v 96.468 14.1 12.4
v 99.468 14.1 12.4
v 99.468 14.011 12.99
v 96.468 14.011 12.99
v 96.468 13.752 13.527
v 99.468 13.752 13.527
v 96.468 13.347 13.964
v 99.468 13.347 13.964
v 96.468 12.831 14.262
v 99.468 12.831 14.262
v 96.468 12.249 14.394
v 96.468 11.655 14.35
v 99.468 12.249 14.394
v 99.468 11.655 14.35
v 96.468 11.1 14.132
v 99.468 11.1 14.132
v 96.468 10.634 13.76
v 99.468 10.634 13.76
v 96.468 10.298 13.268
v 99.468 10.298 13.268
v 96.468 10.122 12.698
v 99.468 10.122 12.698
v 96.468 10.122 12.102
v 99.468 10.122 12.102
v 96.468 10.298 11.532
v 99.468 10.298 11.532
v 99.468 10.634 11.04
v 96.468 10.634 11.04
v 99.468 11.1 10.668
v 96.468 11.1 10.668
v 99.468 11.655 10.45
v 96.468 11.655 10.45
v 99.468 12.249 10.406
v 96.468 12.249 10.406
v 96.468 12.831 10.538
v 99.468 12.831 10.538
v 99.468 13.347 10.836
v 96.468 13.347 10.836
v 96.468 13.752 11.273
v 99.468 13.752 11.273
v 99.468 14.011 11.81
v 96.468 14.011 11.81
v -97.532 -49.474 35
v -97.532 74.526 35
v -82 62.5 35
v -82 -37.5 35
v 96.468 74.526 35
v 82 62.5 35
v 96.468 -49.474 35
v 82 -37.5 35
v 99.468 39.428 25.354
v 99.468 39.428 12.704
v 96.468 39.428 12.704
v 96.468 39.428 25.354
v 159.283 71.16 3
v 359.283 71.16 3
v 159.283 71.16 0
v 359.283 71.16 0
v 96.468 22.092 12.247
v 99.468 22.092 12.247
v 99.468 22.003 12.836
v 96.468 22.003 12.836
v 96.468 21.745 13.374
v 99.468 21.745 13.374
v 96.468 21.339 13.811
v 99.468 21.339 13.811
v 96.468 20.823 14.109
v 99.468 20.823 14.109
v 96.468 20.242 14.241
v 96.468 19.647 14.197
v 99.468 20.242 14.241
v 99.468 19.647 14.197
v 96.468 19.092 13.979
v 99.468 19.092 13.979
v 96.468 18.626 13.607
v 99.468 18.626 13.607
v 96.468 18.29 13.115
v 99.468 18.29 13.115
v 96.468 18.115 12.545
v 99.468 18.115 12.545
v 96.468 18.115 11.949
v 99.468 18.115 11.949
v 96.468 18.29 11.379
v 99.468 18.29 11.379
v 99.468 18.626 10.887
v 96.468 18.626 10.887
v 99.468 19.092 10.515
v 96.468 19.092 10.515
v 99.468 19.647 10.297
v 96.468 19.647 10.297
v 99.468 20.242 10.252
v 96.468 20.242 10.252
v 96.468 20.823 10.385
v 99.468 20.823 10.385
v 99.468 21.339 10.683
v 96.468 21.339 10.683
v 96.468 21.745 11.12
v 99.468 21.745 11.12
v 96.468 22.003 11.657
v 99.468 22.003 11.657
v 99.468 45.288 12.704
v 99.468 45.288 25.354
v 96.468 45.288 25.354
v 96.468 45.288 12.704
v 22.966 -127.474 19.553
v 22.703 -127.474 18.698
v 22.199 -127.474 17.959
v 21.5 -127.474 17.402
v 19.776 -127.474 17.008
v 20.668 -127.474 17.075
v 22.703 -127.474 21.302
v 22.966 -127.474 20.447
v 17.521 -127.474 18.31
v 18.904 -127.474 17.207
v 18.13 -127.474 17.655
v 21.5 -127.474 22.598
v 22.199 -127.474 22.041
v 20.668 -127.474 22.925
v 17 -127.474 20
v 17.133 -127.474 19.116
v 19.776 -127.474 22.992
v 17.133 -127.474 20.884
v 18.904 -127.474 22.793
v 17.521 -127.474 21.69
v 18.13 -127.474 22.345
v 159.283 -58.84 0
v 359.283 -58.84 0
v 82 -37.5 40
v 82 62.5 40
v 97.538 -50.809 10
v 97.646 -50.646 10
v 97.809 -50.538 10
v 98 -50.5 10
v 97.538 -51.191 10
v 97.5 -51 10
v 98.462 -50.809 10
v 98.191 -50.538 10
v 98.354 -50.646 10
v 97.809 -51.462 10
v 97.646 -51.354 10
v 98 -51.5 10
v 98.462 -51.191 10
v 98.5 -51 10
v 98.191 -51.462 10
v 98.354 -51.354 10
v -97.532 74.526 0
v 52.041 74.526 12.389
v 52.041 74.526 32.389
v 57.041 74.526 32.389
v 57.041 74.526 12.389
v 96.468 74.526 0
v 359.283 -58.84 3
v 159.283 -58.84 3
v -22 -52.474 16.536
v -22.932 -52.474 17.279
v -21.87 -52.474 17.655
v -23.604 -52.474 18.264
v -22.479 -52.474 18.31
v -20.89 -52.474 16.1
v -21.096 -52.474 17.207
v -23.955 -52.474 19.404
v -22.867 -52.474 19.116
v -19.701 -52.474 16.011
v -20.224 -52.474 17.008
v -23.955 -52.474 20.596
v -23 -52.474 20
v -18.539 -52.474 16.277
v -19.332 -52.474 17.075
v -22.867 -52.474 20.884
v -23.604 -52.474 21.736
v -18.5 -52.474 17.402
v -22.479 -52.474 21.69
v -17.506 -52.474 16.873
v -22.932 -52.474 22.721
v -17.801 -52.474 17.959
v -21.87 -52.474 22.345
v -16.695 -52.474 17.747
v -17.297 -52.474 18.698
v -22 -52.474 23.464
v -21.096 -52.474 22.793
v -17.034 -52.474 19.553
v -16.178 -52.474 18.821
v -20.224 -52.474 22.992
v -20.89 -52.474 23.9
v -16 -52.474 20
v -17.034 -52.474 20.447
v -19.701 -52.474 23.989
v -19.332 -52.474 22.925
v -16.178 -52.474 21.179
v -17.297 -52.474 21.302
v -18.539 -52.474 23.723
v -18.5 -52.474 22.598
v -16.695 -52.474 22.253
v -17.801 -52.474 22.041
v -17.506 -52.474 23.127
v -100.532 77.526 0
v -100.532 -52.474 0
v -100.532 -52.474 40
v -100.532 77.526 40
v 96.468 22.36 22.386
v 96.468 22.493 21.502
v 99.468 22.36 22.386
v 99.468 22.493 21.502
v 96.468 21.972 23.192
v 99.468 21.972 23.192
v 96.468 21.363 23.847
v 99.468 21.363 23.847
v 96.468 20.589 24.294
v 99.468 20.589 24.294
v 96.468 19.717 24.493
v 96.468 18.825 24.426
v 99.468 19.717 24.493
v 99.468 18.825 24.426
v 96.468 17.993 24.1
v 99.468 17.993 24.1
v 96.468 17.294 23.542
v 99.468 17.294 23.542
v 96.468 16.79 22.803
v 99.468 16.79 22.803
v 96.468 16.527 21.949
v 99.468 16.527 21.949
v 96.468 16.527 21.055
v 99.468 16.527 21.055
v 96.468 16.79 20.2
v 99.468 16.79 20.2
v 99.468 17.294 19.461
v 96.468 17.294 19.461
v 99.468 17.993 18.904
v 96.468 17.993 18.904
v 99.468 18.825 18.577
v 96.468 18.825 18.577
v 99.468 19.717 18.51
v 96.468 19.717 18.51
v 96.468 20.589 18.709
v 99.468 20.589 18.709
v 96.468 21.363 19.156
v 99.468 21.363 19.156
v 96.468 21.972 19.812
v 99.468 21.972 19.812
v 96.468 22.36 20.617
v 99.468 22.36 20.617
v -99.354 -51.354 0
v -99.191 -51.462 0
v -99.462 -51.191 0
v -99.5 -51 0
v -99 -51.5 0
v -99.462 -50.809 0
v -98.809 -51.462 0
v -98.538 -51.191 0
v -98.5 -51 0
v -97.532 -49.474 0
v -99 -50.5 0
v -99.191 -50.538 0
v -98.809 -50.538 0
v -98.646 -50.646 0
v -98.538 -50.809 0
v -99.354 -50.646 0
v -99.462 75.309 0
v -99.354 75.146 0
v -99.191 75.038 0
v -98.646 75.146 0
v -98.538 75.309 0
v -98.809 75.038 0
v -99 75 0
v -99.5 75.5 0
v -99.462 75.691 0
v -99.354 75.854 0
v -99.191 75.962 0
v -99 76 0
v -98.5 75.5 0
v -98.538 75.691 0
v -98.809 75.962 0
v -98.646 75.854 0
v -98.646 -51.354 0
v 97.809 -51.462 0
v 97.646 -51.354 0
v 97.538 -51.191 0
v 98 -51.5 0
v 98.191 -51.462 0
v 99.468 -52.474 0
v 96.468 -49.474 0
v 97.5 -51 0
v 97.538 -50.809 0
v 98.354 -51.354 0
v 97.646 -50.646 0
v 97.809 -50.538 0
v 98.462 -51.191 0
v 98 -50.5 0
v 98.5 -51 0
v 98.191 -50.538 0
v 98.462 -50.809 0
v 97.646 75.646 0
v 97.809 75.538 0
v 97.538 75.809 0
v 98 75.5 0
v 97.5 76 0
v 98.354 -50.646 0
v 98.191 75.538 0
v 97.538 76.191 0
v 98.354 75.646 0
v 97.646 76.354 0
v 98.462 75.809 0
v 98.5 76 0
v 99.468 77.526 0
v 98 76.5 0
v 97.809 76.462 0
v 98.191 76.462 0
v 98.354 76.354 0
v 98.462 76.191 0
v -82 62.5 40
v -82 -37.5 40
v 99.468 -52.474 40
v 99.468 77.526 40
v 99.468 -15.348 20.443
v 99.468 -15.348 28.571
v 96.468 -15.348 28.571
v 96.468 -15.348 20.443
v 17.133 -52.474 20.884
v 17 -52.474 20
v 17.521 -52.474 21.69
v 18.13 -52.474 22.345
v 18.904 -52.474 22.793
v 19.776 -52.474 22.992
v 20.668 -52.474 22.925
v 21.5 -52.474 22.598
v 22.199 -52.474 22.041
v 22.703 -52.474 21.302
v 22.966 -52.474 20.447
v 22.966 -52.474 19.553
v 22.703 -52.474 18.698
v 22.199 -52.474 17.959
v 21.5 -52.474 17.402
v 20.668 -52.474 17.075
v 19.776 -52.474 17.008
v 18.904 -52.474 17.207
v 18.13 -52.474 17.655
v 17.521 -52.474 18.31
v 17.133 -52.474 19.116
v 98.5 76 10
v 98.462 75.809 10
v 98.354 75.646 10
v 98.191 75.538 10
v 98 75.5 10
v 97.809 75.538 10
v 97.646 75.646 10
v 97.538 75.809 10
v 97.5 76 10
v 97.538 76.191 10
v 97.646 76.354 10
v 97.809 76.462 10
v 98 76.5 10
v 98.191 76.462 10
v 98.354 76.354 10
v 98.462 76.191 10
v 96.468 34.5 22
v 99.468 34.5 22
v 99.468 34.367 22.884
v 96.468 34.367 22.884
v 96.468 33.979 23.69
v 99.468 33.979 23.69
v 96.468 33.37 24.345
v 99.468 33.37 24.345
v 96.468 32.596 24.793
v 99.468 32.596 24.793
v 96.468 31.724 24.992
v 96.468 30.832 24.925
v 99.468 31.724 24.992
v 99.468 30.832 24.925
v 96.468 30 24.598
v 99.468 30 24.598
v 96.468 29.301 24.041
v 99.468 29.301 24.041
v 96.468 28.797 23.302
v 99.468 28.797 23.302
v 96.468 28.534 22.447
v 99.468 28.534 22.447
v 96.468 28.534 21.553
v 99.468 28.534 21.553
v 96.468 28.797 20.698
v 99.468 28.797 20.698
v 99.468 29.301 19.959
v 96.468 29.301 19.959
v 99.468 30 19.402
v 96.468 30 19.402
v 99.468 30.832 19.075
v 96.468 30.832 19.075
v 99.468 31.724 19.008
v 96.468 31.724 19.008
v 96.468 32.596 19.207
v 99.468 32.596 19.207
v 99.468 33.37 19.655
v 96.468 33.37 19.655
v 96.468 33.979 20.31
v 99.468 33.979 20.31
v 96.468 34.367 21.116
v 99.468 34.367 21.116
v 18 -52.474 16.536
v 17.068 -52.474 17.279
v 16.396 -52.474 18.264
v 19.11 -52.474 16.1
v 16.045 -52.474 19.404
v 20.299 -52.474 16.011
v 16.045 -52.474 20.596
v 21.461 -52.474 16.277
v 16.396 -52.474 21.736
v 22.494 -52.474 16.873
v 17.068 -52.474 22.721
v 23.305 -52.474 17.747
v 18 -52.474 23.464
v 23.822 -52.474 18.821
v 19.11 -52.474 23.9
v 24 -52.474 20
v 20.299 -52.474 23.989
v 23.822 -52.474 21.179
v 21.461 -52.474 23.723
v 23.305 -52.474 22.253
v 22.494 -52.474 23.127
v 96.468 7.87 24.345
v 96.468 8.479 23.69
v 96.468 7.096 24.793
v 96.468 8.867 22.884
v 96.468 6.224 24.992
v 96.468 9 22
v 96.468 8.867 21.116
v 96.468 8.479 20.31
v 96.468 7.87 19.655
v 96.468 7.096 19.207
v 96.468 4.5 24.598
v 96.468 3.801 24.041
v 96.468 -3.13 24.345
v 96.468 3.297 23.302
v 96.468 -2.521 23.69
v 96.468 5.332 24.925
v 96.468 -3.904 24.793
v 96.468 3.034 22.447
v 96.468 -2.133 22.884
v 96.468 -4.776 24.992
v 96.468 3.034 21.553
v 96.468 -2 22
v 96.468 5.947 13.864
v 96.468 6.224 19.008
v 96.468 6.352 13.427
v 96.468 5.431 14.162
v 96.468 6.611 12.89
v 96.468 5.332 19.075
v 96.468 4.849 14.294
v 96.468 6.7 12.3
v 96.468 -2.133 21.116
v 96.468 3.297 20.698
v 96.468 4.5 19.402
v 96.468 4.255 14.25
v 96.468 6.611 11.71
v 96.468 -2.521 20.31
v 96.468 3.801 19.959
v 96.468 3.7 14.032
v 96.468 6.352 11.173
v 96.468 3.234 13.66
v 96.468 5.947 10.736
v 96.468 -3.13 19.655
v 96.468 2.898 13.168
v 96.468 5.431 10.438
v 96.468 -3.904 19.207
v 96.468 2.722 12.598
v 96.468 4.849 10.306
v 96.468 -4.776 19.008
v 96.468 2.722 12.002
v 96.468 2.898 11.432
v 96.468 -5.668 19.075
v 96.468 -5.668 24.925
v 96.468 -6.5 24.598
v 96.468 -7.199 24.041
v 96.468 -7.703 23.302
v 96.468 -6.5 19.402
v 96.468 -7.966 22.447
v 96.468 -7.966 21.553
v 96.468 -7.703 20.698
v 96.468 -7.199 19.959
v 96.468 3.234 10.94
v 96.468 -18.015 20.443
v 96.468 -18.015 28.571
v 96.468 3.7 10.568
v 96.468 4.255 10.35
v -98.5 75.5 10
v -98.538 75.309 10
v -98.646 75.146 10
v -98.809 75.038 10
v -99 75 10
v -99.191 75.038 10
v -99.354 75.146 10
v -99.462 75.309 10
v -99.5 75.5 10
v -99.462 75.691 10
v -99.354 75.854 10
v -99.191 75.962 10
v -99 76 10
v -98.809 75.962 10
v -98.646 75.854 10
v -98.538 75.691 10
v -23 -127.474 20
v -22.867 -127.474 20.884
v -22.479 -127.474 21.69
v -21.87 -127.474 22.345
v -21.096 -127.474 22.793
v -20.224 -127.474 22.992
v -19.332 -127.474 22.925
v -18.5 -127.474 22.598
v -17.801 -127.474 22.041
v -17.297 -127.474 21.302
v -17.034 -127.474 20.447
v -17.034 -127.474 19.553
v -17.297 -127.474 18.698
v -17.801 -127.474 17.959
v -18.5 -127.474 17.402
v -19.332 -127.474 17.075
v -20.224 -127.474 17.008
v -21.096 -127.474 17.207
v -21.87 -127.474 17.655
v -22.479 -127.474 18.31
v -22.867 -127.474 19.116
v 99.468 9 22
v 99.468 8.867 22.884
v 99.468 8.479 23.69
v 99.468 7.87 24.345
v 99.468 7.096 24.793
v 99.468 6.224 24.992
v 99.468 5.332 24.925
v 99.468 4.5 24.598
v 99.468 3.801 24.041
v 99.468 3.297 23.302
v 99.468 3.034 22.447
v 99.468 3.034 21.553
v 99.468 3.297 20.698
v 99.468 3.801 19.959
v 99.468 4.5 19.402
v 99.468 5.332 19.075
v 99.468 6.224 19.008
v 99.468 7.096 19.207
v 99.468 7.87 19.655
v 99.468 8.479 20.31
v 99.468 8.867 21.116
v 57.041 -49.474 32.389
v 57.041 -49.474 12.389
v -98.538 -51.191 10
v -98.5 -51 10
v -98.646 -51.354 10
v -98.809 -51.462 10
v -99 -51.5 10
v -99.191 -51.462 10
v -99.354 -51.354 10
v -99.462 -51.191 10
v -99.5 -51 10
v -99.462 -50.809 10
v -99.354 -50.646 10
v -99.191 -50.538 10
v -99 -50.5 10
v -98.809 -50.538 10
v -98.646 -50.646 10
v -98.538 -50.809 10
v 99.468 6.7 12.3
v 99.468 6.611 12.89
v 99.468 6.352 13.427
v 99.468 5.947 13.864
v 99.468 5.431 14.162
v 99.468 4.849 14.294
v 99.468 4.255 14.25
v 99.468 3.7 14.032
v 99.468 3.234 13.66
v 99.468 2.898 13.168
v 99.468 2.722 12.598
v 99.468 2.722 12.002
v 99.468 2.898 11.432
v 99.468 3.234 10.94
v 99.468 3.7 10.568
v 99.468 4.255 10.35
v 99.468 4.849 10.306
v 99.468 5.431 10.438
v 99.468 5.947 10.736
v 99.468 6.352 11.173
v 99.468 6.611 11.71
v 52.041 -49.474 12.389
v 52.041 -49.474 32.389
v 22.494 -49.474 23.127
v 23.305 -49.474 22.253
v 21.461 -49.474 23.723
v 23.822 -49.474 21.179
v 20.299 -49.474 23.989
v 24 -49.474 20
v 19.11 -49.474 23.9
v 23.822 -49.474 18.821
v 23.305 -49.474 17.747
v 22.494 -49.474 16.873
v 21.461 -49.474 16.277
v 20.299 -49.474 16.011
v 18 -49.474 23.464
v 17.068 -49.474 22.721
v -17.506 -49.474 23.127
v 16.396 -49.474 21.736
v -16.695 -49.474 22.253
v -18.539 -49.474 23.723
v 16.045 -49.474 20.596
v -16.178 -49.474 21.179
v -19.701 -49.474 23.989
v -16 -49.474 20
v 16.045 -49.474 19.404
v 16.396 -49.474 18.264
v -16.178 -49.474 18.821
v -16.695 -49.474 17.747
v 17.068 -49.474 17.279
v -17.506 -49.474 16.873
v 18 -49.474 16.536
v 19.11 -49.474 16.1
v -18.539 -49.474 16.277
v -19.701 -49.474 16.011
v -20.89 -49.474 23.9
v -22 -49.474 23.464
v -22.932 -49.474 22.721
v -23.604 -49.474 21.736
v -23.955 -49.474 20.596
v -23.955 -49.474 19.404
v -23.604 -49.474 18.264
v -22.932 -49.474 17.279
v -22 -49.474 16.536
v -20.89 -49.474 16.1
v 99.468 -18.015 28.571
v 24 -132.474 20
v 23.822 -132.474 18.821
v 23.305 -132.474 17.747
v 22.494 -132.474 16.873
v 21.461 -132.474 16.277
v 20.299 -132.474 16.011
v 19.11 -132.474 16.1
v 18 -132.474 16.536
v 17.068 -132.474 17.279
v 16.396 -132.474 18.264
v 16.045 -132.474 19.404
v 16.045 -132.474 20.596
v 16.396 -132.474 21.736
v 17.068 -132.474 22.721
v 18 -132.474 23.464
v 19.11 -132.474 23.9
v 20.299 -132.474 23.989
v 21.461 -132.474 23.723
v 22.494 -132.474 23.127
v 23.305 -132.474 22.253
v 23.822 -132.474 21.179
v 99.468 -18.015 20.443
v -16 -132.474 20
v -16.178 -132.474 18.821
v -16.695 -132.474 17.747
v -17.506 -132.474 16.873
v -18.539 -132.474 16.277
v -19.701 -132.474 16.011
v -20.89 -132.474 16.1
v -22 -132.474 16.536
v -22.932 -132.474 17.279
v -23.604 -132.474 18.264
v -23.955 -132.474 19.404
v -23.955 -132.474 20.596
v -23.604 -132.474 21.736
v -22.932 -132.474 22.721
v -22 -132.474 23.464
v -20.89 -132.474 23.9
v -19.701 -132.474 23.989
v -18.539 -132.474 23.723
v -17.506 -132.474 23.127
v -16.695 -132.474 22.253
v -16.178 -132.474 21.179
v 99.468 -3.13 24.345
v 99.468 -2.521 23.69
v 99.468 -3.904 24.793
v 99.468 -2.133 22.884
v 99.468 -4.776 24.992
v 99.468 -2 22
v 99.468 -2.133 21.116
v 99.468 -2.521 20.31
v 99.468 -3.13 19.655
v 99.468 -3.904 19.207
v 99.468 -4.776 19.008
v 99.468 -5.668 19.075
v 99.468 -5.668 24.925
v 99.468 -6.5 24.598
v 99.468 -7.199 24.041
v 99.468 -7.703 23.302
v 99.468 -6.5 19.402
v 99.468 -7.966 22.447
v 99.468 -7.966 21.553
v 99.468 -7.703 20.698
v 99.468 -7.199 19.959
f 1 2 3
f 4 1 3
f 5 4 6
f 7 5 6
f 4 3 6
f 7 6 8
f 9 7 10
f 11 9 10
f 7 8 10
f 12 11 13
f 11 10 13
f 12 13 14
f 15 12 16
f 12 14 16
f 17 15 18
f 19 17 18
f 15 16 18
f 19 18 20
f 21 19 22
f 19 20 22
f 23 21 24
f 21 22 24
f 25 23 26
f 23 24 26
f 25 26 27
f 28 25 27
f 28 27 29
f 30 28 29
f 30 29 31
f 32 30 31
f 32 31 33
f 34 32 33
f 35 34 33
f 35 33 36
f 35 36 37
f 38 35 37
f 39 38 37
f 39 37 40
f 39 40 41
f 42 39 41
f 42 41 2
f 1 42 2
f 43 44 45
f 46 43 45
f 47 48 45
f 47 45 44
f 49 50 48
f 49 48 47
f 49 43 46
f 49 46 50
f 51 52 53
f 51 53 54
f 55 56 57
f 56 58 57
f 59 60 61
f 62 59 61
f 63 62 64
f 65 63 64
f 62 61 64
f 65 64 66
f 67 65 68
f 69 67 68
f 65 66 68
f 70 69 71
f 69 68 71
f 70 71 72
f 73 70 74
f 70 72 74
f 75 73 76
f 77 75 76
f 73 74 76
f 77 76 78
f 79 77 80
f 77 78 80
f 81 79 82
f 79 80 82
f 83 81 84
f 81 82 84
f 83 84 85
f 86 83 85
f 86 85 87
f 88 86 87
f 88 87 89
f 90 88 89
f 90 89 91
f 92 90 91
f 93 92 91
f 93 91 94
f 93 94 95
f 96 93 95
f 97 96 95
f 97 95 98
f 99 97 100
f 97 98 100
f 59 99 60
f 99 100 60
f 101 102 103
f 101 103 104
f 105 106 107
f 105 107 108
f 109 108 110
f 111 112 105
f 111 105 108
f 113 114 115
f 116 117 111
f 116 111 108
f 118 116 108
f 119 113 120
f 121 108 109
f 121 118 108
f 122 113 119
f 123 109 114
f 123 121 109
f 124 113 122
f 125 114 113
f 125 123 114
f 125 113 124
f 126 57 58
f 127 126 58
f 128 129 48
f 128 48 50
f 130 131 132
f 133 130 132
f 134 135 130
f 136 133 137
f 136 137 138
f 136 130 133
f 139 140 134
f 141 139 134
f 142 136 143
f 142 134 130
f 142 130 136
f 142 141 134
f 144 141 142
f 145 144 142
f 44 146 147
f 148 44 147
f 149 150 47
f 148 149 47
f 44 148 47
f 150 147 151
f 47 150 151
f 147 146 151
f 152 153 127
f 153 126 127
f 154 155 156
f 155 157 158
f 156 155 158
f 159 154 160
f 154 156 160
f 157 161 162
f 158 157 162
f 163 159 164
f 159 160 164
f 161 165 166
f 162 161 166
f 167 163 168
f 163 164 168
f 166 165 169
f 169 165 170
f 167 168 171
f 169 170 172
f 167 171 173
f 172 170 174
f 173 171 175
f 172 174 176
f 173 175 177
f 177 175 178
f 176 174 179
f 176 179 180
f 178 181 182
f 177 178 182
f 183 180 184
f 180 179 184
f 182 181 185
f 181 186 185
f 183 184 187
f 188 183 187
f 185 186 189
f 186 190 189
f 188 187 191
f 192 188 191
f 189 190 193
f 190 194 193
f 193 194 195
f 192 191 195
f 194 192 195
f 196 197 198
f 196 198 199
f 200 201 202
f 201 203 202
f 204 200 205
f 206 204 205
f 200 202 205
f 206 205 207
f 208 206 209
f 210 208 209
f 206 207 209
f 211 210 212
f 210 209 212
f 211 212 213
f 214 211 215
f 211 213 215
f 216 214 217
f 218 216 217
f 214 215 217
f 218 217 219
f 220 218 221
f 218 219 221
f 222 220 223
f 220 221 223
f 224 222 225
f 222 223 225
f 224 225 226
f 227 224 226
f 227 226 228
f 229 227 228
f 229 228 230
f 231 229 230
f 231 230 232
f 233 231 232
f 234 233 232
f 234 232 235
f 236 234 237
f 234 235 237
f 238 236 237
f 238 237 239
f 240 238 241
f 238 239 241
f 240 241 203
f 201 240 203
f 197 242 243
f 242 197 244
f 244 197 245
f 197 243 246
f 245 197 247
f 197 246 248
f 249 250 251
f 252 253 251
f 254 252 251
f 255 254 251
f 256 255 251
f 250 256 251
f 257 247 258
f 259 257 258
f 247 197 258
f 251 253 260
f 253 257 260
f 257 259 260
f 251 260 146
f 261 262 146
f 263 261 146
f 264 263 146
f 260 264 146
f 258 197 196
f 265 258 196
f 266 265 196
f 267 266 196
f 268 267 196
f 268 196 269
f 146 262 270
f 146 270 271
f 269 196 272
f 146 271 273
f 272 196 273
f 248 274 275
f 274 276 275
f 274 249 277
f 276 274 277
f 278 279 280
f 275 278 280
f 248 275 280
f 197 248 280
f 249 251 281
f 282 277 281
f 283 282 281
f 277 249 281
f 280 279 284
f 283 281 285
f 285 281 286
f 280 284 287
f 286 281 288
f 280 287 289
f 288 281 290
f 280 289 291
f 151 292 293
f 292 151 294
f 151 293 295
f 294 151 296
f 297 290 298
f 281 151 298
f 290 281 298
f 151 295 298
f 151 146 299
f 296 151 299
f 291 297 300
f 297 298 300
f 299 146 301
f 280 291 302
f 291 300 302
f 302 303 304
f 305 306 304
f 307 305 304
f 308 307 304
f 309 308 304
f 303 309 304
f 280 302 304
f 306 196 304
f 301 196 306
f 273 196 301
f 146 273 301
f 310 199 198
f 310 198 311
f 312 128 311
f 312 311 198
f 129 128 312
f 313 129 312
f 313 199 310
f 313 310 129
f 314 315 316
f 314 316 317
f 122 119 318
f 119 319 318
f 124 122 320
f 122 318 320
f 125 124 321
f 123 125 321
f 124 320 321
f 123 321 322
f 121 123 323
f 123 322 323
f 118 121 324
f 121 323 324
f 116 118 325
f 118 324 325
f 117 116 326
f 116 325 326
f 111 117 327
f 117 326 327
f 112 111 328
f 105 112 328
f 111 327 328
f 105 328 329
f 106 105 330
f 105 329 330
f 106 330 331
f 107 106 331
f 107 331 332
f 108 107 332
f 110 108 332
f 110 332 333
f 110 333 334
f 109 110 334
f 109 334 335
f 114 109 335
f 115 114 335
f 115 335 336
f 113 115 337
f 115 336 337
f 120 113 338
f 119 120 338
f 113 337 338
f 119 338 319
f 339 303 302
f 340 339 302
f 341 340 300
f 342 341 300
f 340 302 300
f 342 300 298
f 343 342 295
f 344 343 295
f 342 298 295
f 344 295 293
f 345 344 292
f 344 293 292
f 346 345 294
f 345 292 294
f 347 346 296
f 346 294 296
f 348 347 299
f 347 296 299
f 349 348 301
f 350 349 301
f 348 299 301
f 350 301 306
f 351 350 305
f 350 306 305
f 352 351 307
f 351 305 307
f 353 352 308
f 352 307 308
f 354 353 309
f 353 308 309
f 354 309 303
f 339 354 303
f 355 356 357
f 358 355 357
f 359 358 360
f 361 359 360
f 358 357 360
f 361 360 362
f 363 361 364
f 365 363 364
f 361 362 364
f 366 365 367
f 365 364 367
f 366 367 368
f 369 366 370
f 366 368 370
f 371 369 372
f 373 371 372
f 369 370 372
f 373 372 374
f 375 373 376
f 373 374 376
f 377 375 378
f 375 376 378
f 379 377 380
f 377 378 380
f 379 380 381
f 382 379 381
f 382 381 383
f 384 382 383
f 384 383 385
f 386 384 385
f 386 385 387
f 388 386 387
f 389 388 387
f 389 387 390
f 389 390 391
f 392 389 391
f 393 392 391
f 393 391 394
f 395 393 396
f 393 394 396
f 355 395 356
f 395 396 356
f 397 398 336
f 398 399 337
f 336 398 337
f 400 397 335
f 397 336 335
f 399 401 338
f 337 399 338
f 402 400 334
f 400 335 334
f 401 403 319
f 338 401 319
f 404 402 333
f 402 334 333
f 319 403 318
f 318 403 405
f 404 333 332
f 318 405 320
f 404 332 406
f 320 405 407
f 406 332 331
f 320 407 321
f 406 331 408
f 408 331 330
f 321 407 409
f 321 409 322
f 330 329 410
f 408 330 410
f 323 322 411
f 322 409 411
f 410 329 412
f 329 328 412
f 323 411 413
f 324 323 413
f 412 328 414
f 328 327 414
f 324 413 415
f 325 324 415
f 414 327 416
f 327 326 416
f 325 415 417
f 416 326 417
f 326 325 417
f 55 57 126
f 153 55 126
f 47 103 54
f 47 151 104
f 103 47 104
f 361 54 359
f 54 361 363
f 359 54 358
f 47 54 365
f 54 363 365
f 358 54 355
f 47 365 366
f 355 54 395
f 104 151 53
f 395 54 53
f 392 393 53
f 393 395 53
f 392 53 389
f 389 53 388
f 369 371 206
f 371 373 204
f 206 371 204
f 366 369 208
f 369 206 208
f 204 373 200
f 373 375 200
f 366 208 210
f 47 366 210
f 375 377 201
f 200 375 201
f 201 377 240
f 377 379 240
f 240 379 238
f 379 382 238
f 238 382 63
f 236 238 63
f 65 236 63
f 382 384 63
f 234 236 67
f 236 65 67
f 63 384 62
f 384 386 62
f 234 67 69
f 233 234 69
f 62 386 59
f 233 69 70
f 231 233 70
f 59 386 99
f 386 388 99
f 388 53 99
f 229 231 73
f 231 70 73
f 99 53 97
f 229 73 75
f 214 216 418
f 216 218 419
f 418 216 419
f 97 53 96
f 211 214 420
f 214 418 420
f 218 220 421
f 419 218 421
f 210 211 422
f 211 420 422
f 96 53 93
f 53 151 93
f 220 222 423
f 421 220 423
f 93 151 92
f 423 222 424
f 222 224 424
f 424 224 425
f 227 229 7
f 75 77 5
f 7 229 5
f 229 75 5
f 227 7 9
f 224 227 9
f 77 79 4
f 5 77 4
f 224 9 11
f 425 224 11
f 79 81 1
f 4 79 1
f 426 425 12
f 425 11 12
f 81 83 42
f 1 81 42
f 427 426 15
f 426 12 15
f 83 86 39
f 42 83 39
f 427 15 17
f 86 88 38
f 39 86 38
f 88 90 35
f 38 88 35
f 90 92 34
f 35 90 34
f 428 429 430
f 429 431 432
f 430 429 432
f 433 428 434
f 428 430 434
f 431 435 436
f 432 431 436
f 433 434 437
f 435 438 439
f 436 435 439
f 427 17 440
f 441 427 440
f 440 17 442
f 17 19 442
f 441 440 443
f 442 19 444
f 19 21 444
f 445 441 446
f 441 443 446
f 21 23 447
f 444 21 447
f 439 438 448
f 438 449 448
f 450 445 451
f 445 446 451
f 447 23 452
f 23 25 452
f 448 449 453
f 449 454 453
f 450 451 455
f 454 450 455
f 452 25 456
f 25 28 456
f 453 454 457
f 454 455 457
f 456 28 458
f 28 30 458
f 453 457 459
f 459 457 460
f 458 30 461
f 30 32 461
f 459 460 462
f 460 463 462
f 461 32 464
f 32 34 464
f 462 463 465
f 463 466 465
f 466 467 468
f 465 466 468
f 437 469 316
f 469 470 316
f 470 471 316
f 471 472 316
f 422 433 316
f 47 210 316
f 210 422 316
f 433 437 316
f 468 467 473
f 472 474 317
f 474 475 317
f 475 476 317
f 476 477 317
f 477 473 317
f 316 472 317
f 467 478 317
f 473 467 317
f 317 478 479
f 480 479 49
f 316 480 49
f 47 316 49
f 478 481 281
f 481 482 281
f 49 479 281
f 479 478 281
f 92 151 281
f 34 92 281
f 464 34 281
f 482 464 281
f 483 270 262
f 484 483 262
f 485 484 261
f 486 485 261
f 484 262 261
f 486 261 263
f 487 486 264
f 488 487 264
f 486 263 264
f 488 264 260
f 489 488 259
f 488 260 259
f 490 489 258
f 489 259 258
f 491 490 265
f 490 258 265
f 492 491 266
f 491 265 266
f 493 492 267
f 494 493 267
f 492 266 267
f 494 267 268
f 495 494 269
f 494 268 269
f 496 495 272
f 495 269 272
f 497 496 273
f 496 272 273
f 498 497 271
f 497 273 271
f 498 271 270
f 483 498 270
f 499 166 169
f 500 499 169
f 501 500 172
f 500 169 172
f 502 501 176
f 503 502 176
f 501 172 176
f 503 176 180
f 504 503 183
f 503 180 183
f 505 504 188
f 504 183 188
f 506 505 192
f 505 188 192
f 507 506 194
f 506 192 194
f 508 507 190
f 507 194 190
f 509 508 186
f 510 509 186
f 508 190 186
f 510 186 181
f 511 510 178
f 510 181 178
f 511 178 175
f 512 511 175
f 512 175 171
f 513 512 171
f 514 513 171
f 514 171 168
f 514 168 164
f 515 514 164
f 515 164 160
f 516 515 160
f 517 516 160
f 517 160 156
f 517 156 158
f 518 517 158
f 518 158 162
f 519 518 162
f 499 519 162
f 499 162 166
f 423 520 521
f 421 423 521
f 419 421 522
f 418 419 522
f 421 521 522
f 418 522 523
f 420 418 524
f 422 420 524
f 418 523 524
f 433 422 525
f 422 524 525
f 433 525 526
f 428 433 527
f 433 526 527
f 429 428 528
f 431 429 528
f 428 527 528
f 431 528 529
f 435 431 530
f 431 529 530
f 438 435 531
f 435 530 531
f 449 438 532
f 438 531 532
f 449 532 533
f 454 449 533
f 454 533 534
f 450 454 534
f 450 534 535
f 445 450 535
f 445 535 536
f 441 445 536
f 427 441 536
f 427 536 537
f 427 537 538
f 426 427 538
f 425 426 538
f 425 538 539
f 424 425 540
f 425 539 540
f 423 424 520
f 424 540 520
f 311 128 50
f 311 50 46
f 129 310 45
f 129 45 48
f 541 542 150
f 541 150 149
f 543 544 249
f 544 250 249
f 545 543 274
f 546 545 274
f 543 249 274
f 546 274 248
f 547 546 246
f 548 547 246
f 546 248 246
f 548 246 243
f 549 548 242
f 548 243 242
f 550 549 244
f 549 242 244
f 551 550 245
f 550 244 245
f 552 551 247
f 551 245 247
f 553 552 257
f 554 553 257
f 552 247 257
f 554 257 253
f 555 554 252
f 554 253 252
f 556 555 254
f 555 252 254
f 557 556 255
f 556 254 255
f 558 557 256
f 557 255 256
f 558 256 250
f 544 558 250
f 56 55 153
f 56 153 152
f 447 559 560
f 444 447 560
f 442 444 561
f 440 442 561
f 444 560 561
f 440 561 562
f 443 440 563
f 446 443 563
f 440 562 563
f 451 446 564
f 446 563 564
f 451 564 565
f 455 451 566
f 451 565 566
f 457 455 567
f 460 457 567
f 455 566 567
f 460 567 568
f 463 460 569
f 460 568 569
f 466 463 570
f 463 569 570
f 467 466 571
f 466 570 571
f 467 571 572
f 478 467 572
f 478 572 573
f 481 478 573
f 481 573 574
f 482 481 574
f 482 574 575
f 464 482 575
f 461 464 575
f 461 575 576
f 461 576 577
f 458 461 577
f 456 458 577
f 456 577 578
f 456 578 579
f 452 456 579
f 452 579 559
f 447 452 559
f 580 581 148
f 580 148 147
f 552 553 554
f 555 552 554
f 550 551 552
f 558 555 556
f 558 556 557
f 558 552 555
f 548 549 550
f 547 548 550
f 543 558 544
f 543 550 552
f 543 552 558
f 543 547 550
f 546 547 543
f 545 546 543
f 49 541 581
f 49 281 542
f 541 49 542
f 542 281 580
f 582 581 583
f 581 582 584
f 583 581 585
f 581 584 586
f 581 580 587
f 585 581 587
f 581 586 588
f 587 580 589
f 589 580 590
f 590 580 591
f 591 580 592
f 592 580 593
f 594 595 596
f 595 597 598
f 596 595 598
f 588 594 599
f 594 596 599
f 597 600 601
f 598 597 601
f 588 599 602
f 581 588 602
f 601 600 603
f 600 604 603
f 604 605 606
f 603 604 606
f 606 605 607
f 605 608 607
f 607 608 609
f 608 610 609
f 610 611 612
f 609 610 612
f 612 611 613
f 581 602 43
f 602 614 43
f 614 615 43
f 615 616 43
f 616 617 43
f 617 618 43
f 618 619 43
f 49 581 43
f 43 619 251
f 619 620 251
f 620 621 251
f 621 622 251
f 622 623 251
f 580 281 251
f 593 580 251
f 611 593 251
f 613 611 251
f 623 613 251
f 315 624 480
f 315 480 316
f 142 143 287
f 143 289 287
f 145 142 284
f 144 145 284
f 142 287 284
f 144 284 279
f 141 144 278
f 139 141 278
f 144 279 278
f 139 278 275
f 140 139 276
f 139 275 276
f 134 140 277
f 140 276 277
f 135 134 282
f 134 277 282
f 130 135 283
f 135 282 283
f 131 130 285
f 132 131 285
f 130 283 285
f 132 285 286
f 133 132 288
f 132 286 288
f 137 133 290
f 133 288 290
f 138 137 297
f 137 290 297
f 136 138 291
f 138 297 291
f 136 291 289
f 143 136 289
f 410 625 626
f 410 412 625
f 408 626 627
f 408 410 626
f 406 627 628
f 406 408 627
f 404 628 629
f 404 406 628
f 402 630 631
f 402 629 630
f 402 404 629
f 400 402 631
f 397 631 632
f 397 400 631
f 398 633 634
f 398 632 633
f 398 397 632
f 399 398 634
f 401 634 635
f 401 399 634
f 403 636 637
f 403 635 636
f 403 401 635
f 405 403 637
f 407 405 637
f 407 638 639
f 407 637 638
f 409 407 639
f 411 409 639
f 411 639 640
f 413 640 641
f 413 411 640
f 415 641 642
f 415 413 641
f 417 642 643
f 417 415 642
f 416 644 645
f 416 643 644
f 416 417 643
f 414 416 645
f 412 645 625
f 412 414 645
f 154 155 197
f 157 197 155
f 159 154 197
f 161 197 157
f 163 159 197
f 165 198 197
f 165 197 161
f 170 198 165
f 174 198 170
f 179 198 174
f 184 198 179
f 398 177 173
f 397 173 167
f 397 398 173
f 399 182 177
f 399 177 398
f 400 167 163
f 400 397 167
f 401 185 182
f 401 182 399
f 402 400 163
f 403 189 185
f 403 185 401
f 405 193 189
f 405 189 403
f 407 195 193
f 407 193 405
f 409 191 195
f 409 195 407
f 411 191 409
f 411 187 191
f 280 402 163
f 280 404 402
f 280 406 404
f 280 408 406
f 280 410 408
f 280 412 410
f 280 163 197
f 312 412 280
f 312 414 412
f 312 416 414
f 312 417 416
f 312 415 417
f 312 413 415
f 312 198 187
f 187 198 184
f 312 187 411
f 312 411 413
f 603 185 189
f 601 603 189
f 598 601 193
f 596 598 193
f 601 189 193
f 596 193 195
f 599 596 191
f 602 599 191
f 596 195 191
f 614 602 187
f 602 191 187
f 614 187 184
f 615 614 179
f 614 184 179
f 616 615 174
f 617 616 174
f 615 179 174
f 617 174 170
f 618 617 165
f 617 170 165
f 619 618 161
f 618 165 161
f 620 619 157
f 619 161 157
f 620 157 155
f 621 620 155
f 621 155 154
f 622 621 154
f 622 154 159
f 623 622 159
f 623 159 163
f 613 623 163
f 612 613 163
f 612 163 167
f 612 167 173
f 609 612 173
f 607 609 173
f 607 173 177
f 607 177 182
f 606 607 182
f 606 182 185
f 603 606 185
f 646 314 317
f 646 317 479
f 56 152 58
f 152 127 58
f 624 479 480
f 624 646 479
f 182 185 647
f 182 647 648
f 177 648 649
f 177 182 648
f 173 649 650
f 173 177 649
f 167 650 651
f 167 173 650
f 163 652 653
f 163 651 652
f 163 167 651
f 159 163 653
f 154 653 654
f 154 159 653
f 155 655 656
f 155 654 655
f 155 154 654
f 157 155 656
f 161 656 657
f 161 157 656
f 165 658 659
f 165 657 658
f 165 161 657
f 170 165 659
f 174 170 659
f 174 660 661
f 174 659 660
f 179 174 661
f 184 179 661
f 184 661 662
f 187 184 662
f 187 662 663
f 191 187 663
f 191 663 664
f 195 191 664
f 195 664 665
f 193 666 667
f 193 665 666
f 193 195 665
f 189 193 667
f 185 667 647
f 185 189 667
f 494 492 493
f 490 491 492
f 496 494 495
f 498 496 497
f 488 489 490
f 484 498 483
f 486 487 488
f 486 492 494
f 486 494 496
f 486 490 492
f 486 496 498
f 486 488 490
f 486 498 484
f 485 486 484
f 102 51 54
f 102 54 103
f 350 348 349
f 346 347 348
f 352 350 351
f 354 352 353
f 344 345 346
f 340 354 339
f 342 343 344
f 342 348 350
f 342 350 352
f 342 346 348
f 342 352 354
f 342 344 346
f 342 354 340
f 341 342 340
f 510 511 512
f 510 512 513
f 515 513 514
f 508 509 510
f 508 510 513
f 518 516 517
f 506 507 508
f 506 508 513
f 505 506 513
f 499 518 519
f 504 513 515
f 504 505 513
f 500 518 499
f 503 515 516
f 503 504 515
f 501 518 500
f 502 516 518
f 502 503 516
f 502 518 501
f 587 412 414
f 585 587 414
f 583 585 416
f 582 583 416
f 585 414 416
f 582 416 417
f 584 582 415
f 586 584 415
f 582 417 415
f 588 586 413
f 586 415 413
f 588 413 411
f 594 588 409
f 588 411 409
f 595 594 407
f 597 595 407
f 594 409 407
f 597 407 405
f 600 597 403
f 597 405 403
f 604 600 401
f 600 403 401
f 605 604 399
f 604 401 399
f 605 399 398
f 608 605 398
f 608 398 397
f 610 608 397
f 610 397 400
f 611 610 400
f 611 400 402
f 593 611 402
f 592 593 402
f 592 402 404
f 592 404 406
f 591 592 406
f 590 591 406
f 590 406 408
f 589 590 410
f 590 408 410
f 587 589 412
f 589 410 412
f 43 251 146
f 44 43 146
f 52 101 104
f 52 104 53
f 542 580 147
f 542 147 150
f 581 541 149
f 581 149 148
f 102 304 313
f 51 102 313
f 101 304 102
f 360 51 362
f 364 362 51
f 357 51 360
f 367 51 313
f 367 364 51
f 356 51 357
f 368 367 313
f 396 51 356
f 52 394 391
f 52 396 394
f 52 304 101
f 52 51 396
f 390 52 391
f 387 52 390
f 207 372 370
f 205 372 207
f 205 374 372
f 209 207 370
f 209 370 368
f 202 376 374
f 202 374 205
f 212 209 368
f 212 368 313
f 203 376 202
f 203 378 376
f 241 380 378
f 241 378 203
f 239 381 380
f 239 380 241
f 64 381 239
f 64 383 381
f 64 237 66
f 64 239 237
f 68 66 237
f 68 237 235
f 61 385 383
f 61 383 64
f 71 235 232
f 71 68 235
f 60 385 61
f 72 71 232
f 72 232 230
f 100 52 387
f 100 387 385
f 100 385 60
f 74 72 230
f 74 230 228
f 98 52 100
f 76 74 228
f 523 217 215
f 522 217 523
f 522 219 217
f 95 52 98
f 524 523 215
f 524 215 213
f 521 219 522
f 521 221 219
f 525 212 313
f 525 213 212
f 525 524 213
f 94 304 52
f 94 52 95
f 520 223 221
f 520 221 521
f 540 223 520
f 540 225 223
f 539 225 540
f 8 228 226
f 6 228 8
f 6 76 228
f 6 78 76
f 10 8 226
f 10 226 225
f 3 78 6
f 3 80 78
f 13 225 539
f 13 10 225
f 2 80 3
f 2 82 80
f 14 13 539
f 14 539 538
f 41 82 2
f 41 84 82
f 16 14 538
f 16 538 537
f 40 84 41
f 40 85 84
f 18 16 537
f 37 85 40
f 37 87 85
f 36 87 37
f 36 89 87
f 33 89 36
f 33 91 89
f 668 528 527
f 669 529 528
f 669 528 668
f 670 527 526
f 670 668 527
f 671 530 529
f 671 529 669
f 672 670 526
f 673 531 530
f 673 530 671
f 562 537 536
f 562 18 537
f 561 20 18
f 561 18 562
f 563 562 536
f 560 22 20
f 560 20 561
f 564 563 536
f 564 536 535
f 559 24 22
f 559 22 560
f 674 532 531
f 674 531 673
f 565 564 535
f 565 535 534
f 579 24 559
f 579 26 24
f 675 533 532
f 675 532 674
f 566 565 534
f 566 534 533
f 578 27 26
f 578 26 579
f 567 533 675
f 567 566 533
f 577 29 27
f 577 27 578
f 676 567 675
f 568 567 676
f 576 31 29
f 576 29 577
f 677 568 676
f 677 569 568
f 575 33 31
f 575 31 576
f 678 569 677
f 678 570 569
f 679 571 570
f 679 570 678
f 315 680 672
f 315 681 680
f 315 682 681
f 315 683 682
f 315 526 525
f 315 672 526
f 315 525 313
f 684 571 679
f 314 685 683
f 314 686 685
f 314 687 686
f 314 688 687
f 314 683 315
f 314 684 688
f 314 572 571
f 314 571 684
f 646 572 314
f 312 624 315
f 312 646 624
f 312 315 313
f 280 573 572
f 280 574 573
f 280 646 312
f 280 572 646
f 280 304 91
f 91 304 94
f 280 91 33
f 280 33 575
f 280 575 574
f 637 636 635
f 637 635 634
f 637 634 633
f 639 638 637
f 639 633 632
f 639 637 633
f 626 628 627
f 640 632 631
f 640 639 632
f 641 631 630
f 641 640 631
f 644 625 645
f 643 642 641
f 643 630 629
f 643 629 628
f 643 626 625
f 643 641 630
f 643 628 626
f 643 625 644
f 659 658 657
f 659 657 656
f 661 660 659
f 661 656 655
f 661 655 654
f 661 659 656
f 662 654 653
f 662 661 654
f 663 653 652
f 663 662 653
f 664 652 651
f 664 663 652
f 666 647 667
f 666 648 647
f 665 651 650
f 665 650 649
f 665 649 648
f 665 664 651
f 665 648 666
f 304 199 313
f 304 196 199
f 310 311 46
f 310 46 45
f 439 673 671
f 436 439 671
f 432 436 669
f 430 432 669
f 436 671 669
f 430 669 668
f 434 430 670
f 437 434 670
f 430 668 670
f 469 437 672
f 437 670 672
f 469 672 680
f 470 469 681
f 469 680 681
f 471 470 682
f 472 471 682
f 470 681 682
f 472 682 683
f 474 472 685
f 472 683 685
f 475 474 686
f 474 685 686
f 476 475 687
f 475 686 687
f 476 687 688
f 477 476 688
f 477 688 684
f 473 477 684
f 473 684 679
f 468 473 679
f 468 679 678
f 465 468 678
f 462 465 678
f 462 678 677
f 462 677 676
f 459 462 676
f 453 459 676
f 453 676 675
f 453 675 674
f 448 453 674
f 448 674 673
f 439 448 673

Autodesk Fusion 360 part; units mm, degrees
sketch "Sketch1" plane through (0, 0, 0) normal (0, 0, 1) x (1, 0, 0)
  line L0 (99.4684, -52.4738) -> (-100.5316, -52.4738)
  line L1 (-100.5316, -52.4738) -> (-100.5316, 77.5262)
  line L2 (-100.5316, 77.5262) -> (99.4684, 77.5262)
  line L3 (99.4684, 77.5262) -> (99.4684, -52.4738)
  dimension "d1" = 200
  dimension "d2" = 130
extrude "Extrude1" add sketch "Sketch1" along normal blind 40 makes body 1
sketch "Sketch2" plane through (0, 0, 40) normal (0, 0, 1) x (-1, 0, 0)
  line L0 (-99.4684, -77.5262) -> (100.5316, -77.5262)
  line L1 (100.5316, -77.5262) -> (100.5316, 52.4738)
  line L2 (100.5316, 52.4738) -> (-99.4684, 52.4738)
  line L3 (-99.4684, 52.4738) -> (-99.4684, -77.5262)
  line L4 (82, -62.5) -> (-82, -62.5)
  line L5 (-82, -62.5) -> (-82, 37.5)
  line L6 (-82, 37.5) -> (82, 37.5)
  line L7 (82, 37.5) -> (82, -62.5)
  line L8 (82, -62.5) -> (-82, 37.5) construction
  line L9 (-82, -62.5) -> (82, 37.5) construction
  point P0 (0, -12.5)
  dimension "d5" = 164
  dimension "d6" = 100
extrude "Extrude2" cut sketch "Sketch2" along normal blind 0 and the other way blind 5 contours L4 L5 L6 L7 bodies 1
sketch "Sketch3" plane through (0, 0, 0) normal (0, 0, -1) x (1, 0, 0)
  line L0 (-100.5316, -77.5262) -> (99.4684, -77.5262)
  line L1 (99.4684, -77.5262) -> (99.4684, 52.4738)
  line L2 (99.4684, 52.4738) -> (-100.5316, 52.4738)
  line L3 (-100.5316, 52.4738) -> (-100.5316, -77.5262)
sketch "Sketch4" plane through (0, 0, 0) normal (0, 0, -1) x (1, 0, 0)
  line L0 (96.4684, 49.4738) -> (-97.5316, 49.4738)
  line L1 (-97.5316, 49.4738) -> (-97.5316, -74.5262)
  line L2 (-97.5316, -74.5262) -> (96.4684, -74.5262)
  line L3 (96.4684, -74.5262) -> (96.4684, 49.4738)
  line L4 (96.4684, 49.4738) -> (-97.5316, -74.5262) construction
  line L5 (-97.5316, 49.4738) -> (96.4684, -74.5262) construction
  line L6 (99.4684, 52.4738) -> (-100.5316, 52.4738)
  line L7 (-100.5316, 52.4738) -> (-100.5316, -77.5262)
  point P0 (-0.5316, -12.5262)
  dimension "d11" = 194
  dimension "d12" = 124
  dimension "d13" = 3
  dimension "d14" = 3
extrude "Extrude3" cut sketch "Sketch4" along normal blind 0 and the other way blind 35 bodies 1
sketch "Sketch5" plane through (99.4684, 0, 0) normal (1, 0, 0) x (0, 1, 0)
  line L0 (-52.4738, 0) -> (77.5262, 0)
  line L1 (77.5262, 0) -> (77.5262, 40)
  line L2 (77.5262, 40) -> (-52.4738, 40)
  line L3 (-52.4738, 40) -> (-52.4738, 0)
sketch "Sketch6" plane through (99.4684, 0, 0) normal (1, 0, 0) x (0, 1, 0)
  circle A0 centre (-5, 22) radius 3
  circle A1 centre (6, 22) radius 3
  circle A2 centre (19.493, 21.5017) radius 3
  circle A3 centre (31.5, 22) radius 3
  circle A4 centre (4.7, 12.3) radius 2
  circle A5 centre (12.1, 12.4) radius 2
  circle A6 centre (20.0923, 12.2469) radius 2
  line L0 (-18.0153, 28.5707) -> (-15.3483, 28.5707)
  line L1 (-15.3483, 28.5707) -> (-15.3483, 20.4427)
  line L2 (-15.3483, 20.4427) -> (-18.0153, 20.4427)
  line L3 (-18.0153, 20.4427) -> (-18.0153, 28.5707)
  line L4 (39.4285, 24.5918) -> (39.4285, 25.3538)
  line L5 (39.4285, 25.3538) -> (45.2885, 25.3538)
  line L6 (45.2885, 25.3538) -> (45.2885, 12.7038)
  line L7 (45.2885, 12.7038) -> (39.4285, 12.7038)
  line L8 (39.4285, 12.7038) -> (39.4285, 25.3538)
  dimension "d19" = 6
  dimension "d21" = 6
  dimension "d23" = 6
  dimension "d25" = 6
  dimension "d29" = 4
  dimension "d31" = 4
  dimension "d33" = 4
  dimension "d35" = 2.667
  dimension "d36" = 8.128
  dimension "d39" = 0.762
  dimension "d40" = 5.86
  dimension "d41" = 12.65
extrude "Extrude4" cut sketch "Sketch6" against normal blind 3 bodies 1
sketch "Sketch7" plane through (0, 0, 0) normal (0, 1, 0) x (1, 0, 0)
sketch "Sketch8" plane through (0, -52.4738, 0) normal (0, -1, 0) x (1, 0, 0)
  line L0 (-100.5316, 0) -> (99.4684, 0)
  line L1 (99.4684, 0) -> (99.4684, 40)
  line L2 (99.4684, 40) -> (-100.5316, 40)
  line L3 (-100.5316, 40) -> (-100.5316, 0)
  circle A0 centre (-20, 20) radius 4
  circle A1 centre (20, 20) radius 4
  dimension "d44" = 8
  dimension "d45" = 8
extrude "Extrude5" cut sketch "Sketch8" against normal blind 3 contours A0 | A1 bodies 1
sketch "Sketch9" plane through (0, -52.4738, 0) normal (0, -1, 0) x (1, 0, 0)
  circle A0 centre (-20, 20) radius 4
  circle A1 centre (20, 20) radius 4
  line L0 (-100.5316, 0) -> (99.4684, 0)
  line L1 (99.4684, 0) -> (99.4684, 40)
  line L2 (99.4684, 40) -> (-100.5316, 40)
  line L3 (-100.5316, 40) -> (-100.5316, 0)
  circle A2 centre (-20, 20) radius 4
  circle A3 centre (20, 20) radius 4
extrude "Extrude6" add sketch "Sketch9" along normal blind 80 separate body contours A0 A2 | A1 A3 makes body 2 at (23.995, -105.8071, 19.8006) makes body 3 at (-16.005, -105.8071, 19.8006)
sketch "Sketch10" plane through (0, -49.4738, 0) normal (0, 1, 0) x (-1, 0, 0)
  circle A0 centre (20, 20) radius 4
  circle A1 centre (-20, 20) radius 4
  line L0 (-96.4684, 0) -> (97.5316, 0)
  line L1 (97.5316, 0) -> (97.5316, 35)
  line L2 (97.5316, 35) -> (-96.4684, 35)
  line L3 (-96.4684, 35) -> (-96.4684, 0)
  circle A2 centre (-20, 20) radius 3
  circle A3 centre (20, 20) radius 3
  dimension "d50" = 6
  dimension "d51" = 6
extrude "Extrude7" cut sketch "Sketch10" against normal blind 78 contours A2 | A3 bodies 2 3
sketch "Sketch11" plane through (0, -52.4738, 0) normal (0, -1, 0) x (1, 0, 0)
  circle A0 centre (-20, 20) radius 4
  circle A1 centre (20, 20) radius 4
  line L0 (-100.5316, 0) -> (99.4684, 0)
  line L1 (99.4684, 0) -> (99.4684, 40)
  line L2 (99.4684, 40) -> (-100.5316, 40)
  line L3 (-100.5316, 40) -> (-100.5316, 0)
  line L4 (52.0412, 12.3894) -> (57.0412, 12.3894)
  line L5 (57.0412, 12.3894) -> (57.0412, 32.3894)
  line L6 (57.0412, 32.3894) -> (52.0412, 32.3894)
  line L7 (52.0412, 32.3894) -> (52.0412, 12.3894)
  dimension "d54" = 5
  dimension "d55" = 20
extrude "Extrude8" add sketch "Sketch11" against normal blind 130 contours L4 L5 L6 L7 bodies 1
sketch "Sketch12" plane through (0, 0, 0) normal (0, 0, -1) x (1, 0, 0)
  line L0 (-100.5333, 52.4758) -> (99.4667, 52.4758)
  line L1 (99.4667, 52.4758) -> (99.4667, -77.5242)
  line L2 (99.4667, -77.5242) -> (-100.5333, -77.5242)
  line L3 (-100.5333, -77.5242) -> (-100.5333, 52.4758)
  circle A0 centre (-99, 51) radius 0.5
  circle A1 centre (98, 51) radius 0.5
  circle A2 centre (98, -76) radius 0.5
  circle A3 centre (-99, -75.5) radius 0.5
  dimension "d58" = 200
  dimension "d59" = 130
  dimension "d60" = 1
  dimension "d61" = 1
  dimension "d62" = 1
  dimension "d63" = 1
extrude "Extrude9" cut sketch "Sketch12" against normal blind 10 contours A0 | A1 | A2 | A3 bodies 1
sketch "Sketch13" plane through (0, 0, 0) normal (0, 0, 1) x (1, 0, 0)
  line L0 (159.2828, -58.8395) -> (359.2828, -58.8395)
  line L1 (359.2828, -58.8395) -> (359.2828, 71.1605)
  line L2 (359.2828, 71.1605) -> (159.2828, 71.1605)
  line L3 (159.2828, 71.1605) -> (159.2828, -58.8395)
  dimension "d66" = 200
  dimension "d67" = 130
extrude "Extrude10" add sketch "Sketch13" along normal blind 3 separate body makes body 4
